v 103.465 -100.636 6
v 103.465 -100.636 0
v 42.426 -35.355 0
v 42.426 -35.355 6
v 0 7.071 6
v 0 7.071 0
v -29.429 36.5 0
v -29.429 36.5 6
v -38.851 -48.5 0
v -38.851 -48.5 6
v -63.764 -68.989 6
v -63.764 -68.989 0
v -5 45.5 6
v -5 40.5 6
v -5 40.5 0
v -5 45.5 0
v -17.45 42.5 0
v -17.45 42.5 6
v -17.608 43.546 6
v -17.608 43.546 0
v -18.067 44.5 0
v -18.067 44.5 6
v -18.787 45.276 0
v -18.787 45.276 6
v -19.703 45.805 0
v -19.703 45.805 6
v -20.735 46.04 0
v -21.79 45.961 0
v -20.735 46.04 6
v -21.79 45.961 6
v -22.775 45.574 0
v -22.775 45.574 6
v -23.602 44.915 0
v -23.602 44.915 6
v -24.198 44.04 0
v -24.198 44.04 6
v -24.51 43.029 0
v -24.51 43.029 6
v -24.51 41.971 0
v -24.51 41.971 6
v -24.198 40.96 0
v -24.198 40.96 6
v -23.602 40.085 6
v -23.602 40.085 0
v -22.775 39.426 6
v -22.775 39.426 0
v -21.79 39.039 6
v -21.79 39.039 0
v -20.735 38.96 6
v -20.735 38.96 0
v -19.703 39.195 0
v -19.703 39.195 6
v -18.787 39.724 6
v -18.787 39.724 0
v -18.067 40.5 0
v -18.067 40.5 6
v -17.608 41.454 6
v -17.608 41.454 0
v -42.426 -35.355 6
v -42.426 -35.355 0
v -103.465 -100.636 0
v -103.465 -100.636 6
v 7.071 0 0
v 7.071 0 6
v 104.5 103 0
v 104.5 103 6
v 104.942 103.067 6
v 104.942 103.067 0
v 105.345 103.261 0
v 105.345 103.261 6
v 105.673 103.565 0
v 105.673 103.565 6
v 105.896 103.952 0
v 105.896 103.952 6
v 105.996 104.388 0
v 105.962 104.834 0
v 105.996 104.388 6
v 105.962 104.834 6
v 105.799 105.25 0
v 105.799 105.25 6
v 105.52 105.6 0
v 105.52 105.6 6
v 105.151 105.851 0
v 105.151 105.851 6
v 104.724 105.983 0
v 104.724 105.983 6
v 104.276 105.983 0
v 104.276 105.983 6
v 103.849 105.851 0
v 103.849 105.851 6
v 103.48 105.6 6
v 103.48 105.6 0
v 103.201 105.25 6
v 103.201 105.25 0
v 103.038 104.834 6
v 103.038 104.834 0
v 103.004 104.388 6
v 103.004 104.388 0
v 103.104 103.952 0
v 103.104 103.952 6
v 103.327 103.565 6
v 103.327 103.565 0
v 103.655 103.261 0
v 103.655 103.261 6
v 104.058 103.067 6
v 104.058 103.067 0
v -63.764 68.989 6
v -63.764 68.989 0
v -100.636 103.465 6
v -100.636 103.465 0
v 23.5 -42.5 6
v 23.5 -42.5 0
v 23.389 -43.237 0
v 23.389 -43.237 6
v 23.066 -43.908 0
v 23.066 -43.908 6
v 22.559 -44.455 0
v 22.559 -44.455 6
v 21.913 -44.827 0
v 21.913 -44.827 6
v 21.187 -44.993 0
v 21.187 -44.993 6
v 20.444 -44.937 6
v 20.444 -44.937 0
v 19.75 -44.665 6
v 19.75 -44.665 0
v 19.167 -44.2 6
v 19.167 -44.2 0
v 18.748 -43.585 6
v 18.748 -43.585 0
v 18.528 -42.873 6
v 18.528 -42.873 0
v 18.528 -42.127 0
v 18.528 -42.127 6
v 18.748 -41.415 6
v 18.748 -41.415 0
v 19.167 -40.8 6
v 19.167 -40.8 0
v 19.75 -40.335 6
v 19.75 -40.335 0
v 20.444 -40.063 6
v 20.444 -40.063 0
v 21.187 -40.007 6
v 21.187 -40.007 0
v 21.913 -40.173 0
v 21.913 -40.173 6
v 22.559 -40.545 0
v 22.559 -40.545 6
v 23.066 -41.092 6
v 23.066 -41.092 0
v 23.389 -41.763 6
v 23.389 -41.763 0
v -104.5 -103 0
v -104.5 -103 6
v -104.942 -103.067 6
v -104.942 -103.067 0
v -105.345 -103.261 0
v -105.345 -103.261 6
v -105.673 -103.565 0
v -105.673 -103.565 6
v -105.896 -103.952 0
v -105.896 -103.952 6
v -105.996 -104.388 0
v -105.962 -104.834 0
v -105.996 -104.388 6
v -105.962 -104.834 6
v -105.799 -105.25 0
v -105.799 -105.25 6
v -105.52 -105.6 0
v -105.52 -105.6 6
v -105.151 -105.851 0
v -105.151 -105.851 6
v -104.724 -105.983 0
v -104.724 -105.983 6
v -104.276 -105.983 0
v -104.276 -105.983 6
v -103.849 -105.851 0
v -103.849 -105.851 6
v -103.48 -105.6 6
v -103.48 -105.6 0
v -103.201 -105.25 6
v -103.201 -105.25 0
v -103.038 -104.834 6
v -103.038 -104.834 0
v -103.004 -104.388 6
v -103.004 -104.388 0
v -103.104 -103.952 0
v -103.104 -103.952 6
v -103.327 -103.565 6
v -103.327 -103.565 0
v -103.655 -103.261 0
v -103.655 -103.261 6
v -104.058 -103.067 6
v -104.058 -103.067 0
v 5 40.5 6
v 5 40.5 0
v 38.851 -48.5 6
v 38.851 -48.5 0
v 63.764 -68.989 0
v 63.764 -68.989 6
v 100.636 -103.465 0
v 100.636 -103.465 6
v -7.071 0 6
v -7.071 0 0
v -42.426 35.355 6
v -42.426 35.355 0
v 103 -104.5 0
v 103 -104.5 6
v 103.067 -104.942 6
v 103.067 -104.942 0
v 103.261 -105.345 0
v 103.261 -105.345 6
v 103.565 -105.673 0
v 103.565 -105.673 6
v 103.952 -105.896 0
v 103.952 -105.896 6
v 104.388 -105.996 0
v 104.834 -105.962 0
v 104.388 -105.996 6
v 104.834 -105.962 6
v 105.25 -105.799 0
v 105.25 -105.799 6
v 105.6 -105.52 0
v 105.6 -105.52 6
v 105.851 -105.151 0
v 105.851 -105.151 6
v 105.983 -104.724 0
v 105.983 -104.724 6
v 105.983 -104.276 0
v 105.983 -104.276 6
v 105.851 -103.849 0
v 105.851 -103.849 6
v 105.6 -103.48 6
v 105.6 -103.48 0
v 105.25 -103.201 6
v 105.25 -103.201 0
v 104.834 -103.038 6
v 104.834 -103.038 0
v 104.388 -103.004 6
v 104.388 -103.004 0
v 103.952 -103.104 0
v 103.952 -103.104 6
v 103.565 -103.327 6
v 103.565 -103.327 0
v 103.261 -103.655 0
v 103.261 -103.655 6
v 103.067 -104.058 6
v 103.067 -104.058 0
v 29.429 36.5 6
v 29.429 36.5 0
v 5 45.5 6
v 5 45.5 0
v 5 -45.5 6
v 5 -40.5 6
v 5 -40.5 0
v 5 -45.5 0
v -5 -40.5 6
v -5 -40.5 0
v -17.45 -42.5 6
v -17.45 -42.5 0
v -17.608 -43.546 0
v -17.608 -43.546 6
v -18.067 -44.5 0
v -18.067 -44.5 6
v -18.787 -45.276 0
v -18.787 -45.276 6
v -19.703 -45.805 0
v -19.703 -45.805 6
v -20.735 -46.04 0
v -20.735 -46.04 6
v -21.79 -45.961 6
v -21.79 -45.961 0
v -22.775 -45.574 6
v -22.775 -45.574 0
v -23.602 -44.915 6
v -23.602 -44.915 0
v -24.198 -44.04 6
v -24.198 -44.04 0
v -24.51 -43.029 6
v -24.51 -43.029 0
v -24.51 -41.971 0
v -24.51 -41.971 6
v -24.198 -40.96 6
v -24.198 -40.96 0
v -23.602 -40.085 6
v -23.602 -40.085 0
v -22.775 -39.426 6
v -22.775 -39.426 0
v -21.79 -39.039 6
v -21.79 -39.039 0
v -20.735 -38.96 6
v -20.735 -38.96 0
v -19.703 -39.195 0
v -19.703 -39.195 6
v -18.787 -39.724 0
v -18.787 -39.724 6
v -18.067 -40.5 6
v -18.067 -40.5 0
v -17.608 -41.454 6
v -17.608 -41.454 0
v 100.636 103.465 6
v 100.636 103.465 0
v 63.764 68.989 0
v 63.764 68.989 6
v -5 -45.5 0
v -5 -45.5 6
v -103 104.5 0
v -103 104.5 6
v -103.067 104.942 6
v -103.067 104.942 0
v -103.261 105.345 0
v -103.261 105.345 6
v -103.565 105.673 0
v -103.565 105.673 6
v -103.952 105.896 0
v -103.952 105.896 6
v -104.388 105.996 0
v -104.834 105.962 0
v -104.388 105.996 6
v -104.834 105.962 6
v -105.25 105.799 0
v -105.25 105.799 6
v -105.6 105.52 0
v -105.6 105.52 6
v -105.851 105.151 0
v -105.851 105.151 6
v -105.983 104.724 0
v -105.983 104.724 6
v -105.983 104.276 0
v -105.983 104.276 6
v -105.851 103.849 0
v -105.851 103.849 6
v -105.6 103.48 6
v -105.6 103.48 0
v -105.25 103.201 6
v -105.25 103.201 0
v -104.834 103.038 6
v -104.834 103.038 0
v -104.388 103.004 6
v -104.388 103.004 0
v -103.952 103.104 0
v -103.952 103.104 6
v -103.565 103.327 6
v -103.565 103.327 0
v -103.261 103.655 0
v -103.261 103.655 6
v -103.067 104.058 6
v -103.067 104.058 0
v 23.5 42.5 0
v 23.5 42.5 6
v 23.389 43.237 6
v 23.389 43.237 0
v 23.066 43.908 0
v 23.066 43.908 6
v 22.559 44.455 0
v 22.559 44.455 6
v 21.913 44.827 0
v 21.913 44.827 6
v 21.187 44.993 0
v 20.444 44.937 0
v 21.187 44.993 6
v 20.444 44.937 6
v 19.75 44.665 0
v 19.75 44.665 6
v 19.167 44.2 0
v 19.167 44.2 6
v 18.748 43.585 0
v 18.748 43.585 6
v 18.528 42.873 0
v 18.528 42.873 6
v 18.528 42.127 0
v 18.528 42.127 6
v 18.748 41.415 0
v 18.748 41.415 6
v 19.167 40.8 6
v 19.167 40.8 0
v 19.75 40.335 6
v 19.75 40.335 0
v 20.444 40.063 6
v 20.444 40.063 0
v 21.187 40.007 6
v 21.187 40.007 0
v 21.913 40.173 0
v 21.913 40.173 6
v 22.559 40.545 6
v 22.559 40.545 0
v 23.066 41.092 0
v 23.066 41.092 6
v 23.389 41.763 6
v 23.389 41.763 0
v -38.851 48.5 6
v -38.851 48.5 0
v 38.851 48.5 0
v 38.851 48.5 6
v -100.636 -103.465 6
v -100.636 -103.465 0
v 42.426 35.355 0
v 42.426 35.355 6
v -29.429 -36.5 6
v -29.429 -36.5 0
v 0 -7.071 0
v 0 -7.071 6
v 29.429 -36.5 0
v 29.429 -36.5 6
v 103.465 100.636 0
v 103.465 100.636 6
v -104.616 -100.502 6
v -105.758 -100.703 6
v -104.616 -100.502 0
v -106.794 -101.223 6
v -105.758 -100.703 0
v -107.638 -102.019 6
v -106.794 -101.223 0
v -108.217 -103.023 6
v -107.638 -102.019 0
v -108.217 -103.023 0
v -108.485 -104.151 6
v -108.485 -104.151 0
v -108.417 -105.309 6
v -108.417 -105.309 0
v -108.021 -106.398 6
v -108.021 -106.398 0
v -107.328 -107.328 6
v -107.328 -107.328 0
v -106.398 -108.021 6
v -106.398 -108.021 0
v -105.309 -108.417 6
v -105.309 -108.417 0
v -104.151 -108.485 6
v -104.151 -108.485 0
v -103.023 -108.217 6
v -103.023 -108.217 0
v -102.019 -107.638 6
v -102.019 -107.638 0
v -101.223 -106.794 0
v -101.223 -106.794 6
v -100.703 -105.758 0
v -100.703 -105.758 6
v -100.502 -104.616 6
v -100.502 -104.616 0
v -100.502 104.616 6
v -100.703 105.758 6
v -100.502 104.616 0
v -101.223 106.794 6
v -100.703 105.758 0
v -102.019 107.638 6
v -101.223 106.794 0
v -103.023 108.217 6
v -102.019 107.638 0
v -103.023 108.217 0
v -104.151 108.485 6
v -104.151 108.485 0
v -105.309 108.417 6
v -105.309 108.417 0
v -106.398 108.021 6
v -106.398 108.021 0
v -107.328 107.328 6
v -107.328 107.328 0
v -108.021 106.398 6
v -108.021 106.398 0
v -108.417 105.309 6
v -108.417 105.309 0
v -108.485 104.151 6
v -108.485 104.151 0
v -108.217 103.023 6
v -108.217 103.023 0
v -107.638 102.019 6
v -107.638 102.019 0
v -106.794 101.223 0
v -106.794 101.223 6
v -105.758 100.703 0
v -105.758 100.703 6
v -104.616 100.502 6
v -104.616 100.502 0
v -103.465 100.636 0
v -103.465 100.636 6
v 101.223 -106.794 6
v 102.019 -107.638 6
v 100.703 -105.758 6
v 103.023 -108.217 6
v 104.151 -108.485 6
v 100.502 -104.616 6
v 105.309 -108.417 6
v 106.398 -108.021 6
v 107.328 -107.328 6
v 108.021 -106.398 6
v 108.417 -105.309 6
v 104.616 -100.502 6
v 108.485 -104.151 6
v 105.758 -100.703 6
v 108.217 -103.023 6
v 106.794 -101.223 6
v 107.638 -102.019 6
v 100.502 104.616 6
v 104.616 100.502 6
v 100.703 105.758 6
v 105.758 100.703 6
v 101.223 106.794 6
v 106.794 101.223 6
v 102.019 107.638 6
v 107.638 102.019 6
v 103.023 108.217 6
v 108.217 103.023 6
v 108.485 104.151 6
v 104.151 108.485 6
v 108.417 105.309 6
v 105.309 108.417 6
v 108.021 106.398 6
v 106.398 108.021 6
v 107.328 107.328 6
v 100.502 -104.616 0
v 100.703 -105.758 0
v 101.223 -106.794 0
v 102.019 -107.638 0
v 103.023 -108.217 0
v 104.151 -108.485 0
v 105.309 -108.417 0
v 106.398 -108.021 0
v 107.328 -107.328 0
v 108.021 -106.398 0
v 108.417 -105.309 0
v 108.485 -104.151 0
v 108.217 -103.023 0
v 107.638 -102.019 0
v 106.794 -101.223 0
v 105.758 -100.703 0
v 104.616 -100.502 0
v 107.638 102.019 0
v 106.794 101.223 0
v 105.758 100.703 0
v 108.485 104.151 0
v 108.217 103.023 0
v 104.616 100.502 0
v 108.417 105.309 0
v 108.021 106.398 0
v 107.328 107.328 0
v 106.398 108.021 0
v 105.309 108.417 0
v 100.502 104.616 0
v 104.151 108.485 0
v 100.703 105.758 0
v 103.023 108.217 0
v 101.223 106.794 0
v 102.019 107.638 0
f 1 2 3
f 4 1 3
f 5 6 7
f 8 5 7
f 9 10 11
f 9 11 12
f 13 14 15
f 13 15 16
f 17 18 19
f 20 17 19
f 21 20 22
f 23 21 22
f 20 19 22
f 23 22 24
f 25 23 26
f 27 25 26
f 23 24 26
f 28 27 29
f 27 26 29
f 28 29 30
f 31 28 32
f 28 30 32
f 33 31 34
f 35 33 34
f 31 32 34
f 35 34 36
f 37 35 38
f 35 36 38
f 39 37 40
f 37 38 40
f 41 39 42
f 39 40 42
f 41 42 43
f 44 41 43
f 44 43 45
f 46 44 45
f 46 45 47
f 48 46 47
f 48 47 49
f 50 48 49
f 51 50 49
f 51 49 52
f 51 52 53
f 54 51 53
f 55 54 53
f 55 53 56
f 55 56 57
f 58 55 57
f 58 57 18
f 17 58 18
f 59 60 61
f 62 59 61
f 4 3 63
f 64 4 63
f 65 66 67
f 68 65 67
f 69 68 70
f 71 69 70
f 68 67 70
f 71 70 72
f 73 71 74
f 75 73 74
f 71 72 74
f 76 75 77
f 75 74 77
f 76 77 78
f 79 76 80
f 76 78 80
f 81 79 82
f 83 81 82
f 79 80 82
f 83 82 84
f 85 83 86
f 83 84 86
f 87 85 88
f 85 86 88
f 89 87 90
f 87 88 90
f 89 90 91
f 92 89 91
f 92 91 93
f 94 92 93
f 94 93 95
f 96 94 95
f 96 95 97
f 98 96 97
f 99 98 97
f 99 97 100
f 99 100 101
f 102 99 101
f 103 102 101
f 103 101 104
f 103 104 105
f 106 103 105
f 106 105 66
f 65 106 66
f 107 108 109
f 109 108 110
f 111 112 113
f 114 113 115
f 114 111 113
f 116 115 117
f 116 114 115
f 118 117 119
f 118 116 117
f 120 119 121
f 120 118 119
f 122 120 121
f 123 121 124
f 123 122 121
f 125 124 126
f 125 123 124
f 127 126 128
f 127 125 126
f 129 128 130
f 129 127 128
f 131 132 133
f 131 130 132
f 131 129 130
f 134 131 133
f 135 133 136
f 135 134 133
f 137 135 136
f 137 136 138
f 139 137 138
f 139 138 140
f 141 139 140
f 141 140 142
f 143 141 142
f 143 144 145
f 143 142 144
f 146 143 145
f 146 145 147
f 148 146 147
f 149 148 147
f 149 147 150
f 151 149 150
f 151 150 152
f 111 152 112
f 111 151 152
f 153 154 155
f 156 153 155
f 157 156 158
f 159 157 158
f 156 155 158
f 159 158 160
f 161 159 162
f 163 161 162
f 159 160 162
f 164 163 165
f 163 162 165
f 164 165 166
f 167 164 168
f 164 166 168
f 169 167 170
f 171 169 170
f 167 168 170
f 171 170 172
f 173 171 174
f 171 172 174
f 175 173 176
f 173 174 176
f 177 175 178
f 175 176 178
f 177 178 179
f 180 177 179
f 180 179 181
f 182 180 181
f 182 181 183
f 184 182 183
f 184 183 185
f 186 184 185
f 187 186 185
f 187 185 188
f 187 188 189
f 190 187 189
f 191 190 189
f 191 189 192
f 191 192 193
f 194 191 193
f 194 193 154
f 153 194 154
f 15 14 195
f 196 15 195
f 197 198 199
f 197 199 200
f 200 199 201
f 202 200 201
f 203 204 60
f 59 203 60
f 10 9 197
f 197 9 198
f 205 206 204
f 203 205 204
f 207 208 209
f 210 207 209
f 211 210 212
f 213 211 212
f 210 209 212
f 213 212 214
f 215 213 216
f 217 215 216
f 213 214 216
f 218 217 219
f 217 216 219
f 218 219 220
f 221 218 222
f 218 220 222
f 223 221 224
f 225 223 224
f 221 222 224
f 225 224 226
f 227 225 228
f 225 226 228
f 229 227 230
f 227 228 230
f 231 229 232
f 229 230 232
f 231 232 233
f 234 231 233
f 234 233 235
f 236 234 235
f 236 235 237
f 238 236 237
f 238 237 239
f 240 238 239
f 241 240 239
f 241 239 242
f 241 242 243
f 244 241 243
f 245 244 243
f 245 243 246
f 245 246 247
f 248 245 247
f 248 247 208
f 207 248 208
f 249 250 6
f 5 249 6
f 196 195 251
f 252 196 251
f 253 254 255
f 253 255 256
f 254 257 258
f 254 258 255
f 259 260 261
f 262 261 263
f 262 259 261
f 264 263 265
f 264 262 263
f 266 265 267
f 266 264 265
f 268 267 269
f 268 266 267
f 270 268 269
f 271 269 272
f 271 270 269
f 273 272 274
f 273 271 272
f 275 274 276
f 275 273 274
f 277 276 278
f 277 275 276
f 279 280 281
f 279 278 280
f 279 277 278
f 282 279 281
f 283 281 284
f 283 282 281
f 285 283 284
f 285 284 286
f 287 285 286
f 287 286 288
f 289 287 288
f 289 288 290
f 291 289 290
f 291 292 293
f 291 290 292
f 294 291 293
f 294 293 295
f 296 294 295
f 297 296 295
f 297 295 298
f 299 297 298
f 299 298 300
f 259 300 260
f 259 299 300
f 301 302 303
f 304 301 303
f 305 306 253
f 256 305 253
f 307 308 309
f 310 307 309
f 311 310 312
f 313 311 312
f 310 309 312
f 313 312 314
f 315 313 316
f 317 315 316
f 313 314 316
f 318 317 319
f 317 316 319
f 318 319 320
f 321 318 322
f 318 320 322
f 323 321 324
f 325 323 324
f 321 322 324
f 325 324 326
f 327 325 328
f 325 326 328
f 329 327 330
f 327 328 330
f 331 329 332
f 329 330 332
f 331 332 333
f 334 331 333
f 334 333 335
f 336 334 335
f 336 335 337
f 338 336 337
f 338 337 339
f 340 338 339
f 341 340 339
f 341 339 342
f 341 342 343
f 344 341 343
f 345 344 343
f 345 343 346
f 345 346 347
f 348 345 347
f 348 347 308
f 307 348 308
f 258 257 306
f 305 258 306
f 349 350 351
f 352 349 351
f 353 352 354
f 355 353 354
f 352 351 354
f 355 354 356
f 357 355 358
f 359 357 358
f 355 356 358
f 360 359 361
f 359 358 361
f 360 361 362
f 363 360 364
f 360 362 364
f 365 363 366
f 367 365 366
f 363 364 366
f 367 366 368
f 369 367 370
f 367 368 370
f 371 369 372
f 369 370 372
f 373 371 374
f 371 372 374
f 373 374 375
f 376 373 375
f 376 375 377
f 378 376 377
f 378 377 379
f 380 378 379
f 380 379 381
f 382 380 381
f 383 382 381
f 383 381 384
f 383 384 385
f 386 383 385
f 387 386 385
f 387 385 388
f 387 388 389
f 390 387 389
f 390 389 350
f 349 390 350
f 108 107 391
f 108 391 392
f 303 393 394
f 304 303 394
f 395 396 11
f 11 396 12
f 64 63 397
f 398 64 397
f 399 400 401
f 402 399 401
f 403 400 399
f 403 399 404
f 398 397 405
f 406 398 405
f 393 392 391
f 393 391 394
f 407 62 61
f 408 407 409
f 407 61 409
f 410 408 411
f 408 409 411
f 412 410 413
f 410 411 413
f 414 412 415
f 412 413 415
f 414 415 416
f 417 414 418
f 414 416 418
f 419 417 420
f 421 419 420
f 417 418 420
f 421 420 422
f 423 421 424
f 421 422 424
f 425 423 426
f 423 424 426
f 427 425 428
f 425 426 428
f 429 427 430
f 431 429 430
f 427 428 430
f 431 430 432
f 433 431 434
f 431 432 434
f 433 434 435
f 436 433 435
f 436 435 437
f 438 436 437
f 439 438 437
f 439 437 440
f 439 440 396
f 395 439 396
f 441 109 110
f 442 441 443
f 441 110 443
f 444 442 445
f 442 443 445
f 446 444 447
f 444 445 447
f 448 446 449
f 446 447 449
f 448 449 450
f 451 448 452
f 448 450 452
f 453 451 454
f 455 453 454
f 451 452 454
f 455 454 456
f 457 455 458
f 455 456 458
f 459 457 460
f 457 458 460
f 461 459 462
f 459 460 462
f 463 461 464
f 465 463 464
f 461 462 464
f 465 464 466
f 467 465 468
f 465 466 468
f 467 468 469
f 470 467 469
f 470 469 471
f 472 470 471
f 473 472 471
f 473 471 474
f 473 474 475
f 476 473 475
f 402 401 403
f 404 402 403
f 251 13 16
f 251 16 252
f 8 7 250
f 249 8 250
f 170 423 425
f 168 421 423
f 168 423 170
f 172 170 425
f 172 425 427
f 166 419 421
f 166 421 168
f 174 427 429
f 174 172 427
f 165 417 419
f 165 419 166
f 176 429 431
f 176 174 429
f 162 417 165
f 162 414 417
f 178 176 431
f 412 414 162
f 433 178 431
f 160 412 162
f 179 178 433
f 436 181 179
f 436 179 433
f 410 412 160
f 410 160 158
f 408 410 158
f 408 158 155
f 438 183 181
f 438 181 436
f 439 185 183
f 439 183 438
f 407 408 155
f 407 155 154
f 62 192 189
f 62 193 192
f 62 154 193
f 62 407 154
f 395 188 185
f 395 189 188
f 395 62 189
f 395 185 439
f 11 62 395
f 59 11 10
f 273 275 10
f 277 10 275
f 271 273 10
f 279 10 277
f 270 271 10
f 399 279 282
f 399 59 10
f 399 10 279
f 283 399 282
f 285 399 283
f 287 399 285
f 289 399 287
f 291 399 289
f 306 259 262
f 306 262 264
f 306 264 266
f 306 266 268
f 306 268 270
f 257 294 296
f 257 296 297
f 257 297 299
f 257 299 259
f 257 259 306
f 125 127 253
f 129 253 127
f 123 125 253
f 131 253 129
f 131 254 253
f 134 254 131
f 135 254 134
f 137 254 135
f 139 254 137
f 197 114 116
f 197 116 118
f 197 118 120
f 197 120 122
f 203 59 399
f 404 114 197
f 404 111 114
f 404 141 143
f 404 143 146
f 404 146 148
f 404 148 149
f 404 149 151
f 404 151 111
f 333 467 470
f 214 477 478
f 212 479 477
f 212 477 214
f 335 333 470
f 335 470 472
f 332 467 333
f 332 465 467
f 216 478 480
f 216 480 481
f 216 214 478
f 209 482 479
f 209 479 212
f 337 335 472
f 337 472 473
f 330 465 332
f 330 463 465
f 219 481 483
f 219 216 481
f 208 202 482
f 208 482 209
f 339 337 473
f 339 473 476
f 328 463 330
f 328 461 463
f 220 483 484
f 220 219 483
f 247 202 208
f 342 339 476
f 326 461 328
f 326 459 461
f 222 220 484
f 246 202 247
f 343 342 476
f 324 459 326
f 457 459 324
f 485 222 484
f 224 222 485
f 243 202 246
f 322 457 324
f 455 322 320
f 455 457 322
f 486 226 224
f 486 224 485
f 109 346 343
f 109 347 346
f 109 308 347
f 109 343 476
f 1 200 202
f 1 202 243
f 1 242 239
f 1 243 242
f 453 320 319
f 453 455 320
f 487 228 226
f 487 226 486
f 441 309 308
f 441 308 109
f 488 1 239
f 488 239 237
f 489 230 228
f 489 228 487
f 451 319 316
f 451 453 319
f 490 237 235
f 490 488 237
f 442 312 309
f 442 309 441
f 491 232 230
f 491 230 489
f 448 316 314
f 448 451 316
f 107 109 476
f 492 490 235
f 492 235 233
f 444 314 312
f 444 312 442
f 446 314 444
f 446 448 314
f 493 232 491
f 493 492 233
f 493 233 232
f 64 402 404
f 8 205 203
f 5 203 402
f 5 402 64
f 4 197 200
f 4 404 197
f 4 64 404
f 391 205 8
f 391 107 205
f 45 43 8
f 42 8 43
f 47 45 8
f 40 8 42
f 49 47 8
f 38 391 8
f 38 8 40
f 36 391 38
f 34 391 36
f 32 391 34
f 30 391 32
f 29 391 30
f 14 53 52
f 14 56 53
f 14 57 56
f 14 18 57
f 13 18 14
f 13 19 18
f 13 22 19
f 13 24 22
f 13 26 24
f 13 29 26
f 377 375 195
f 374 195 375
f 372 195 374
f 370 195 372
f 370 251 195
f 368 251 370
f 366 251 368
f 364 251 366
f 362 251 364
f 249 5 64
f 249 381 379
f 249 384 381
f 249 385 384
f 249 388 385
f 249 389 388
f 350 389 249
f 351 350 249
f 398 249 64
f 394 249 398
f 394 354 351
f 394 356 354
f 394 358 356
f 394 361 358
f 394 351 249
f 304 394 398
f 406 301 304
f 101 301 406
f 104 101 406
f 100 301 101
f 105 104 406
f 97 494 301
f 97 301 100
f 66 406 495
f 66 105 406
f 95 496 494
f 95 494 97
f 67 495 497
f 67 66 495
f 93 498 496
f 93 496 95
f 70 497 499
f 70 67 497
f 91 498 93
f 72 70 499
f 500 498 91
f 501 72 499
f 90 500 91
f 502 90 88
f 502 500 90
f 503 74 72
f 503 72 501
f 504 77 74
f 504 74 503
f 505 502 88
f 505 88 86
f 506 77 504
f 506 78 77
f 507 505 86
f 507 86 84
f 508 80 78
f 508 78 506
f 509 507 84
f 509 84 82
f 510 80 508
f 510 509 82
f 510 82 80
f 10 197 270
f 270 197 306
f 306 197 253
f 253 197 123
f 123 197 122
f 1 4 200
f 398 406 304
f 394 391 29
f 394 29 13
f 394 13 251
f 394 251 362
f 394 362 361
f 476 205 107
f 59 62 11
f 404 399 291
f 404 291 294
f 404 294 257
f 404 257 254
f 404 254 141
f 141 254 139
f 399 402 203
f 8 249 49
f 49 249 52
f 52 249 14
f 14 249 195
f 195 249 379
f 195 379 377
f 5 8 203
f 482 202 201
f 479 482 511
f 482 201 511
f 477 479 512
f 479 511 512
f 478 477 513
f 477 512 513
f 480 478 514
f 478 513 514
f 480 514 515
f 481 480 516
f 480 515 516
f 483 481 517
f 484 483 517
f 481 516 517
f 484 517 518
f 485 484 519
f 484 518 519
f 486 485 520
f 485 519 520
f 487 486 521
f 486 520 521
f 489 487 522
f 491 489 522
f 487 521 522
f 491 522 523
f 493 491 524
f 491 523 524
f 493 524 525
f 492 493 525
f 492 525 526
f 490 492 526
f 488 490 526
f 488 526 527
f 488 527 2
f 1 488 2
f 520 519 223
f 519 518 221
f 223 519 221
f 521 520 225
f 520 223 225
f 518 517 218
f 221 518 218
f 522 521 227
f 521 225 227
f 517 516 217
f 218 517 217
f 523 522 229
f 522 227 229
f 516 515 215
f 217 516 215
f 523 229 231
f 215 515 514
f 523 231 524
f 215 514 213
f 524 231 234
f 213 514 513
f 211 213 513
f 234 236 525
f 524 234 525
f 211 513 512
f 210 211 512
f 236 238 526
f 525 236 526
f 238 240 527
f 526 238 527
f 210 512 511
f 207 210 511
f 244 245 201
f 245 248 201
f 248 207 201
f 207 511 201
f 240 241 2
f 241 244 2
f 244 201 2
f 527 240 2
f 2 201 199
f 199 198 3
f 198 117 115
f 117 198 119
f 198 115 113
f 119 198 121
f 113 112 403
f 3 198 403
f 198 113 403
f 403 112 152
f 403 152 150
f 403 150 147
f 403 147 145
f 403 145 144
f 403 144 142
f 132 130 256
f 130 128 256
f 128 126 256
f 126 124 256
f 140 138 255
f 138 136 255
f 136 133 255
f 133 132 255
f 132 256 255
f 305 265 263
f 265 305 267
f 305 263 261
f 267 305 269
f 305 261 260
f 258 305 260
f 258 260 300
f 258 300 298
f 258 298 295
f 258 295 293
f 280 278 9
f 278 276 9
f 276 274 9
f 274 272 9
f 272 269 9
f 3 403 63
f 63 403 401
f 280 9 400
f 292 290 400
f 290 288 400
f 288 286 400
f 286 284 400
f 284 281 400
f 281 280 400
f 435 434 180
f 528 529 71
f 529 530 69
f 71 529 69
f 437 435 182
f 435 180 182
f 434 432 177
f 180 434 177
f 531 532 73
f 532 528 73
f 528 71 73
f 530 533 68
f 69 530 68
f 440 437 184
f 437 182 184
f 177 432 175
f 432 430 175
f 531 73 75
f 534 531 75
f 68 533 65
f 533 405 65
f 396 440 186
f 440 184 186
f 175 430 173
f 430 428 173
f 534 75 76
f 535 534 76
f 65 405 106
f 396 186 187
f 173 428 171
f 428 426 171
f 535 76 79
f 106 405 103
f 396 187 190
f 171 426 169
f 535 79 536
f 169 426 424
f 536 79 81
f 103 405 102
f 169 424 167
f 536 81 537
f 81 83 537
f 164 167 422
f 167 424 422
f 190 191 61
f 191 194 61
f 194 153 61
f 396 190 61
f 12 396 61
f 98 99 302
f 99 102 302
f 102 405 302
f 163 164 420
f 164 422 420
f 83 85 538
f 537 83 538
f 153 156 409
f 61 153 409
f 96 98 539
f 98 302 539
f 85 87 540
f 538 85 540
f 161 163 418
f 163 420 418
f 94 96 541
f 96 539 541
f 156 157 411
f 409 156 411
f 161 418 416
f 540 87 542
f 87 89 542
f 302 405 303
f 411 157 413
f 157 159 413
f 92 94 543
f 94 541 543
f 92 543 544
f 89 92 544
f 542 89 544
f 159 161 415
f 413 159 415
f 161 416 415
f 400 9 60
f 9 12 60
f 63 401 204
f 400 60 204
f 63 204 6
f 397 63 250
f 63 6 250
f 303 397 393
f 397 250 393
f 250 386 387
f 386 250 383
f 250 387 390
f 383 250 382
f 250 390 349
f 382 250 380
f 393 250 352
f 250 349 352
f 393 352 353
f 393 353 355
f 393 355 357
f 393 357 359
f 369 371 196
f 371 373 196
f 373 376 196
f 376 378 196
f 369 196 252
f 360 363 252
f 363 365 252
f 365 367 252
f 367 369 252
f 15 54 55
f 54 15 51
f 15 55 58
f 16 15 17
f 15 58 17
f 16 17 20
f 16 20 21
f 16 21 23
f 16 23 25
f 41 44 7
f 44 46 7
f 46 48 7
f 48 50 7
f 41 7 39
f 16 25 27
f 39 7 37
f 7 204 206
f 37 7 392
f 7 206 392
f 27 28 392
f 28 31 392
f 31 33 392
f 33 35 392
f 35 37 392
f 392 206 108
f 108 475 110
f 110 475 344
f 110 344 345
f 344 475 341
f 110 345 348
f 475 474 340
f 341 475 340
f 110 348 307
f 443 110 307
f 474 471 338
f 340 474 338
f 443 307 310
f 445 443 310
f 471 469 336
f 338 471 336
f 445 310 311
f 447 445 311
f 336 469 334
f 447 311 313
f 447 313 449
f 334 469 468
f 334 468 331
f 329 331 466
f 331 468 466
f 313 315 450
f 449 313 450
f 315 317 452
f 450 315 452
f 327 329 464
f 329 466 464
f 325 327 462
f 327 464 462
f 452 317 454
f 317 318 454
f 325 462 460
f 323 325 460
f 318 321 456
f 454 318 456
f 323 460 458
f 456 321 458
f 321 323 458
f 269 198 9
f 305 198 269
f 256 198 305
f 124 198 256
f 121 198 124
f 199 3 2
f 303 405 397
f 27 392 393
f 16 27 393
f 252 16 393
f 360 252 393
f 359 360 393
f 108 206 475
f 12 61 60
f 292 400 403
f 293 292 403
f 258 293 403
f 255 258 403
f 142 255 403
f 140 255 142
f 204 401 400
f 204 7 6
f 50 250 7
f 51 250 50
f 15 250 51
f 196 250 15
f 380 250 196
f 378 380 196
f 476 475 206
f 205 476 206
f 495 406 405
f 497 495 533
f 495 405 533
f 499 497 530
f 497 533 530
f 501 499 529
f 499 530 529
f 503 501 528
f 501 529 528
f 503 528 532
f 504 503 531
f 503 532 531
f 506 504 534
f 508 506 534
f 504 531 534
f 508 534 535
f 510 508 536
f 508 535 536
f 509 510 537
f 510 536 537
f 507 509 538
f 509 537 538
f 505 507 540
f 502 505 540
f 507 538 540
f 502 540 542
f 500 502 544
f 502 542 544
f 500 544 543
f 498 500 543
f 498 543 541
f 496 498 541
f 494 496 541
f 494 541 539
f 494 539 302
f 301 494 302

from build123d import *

# Parameters (mm, degrees)
F0_R         = 4
F1_DEPTH     = 6
F3_DEPTH     = 6
F4_R         = 1.5
F5_DEPTH     = 6.001
F6_COUNT     = 4
F8_W         = 85
F8_H         = 12
F9_DEPTH     = 6
F10_R        = 3.55
F10_R_2      = 2.5
F10_W        = 10
F10_H        = 5
F11_DEPTH    = 6.001
F12_C1_SIZE2 = 3
F12_C1_SIZE  = 30
F12_C2_SIZE2 = 30
F12_C2_SIZE  = 3
F12_C3_SIZE2 = 3
F12_C3_SIZE  = 30
F12_C4_SIZE2 = 30
F12_C4_SIZE  = 3


# Not quite as in the source:
# - a pattern or mirror of a feature is missing from the dataset's text; its kind, count and spacing are read off the source's solid


with BuildPart() as f1:
    # F0 (on Top) → F1 (new body)
    with BuildSketch(Plane.XY):
        with Locations((-104.5, 104.5)):
            Circle(F0_R)
    extrude(amount=F1_DEPTH)

    # F2 (on Top) → F3 (join, through all)
    with BuildSketch(Plane.XY):
        Polygon((-7.0710678119, 0), (0, 0), (0, 7.0710678119), (-35.3553390593, 42.4264068712), (-100.6362966948, 103.4647238196), (-103.4647238196, 100.6362966948), (-42.4264068712, 35.3553390593), align=None)
    extrude(amount=F3_DEPTH)

    # F4 (on face) → F5 (cut, through all)
    with BuildSketch(Plane.XY.offset(6)):
        with Locations((-104.5, 104.5)):
            Circle(F4_R)
    extrude(amount=-F5_DEPTH, mode=Mode.SUBTRACT)


with BuildPart() as f6_1:
    # F6: instance of F1
    add(f1.part.rotate(Axis((0, 0, 3), (0, 0, -1)), 1 * 360 / F6_COUNT))


with BuildPart() as f6_2:
    # F6: instance of F1
    add(f1.part.rotate(Axis((0, 0, 3), (0, 0, -1)), 2 * 360 / F6_COUNT))


with BuildPart() as f6_3:
    # F6: instance of F1
    add(f1.part.rotate(Axis((0, 0, 3), (0, 0, -1)), 3 * 360 / F6_COUNT))


with BuildPart() as f1_1:
    add(f1.part)

    # F7: union F6_1, F6_2, F6_3
    add(f6_1.part)
    add(f6_2.part)
    add(f6_3.part)

    # F8 (on Top) → F9 (join, through all)
    with BuildSketch(Plane.XY):
        with Locations((0, 42.5)):
            Rectangle(F8_W, F8_H)
    f9 = extrude(amount=F9_DEPTH)

    # F9_copies: F9 across plane
    add(f9.mirror(Plane(origin=(0, 0, 0), x_dir=(0, 0, -1), z_dir=(0, -1, 0))))

    # F10 (on face) → F11 (cut, through all)
    with BuildSketch(Plane.XY.offset(6)):
        with Locations((-21, 42.5)):
            Circle(F10_R)
        with Locations((21, 42.5)):
            Circle(F10_R_2)
        with Locations((0, 43)):
            Rectangle(F10_W, F10_H)
    f11 = extrude(amount=-F11_DEPTH, mode=Mode.SUBTRACT)

    # F11_copies: F11 across plane
    add(f11.mirror(Plane(origin=(0, 0, 0), x_dir=(0, 0, -1), z_dir=(0, -1, 0))), mode=Mode.SUBTRACT)

    # F12: chamfer of 3 x 30 on 4 edges, made by hand

    # F12_c1
    f12_c1_edges = [f1_1.edges().sort_by_distance(p)[0] for p in [
        (-41.8510944399, 48.5, 3),
    ]]
    f12_c1_side = f1_1.faces().sort_by_distance((-41.8949210948, 48.5409783396, 3))[0]
    chamfer(f12_c1_edges, length=F12_C1_SIZE, length2=F12_C1_SIZE2, reference=f12_c1_side)

    # F12_c2
    f12_c2_edges = [f1_1.edges().sort_by_distance(p)[0] for p in [
        (41.8510944399, 48.5, 3),
    ]]
    f12_c2_side = f1_1.faces().sort_by_distance((41.7910944399, 48.5, 3))[0]
    chamfer(f12_c2_edges, length=F12_C2_SIZE, length2=F12_C2_SIZE2, reference=f12_c2_side)

    # F12_c3
    f12_c3_edges = [f1_1.edges().sort_by_distance(p)[0] for p in [
        (41.8510944399, -48.5, 3),
    ]]
    f12_c3_side = f1_1.faces().sort_by_distance((41.8949210948, -48.5409783396, 3))[0]
    chamfer(f12_c3_edges, length=F12_C3_SIZE, length2=F12_C3_SIZE2, reference=f12_c3_side)

    # F12_c4
    f12_c4_edges = [f1_1.edges().sort_by_distance(p)[0] for p in [
        (-41.8510944399, -48.5, 3),
    ]]
    f12_c4_side = f1_1.faces().sort_by_distance((-41.7910944399, -48.5, 3))[0]
    chamfer(f12_c4_edges, length=F12_C4_SIZE, length2=F12_C4_SIZE2, reference=f12_c4_side)


solid = f1_1.part
